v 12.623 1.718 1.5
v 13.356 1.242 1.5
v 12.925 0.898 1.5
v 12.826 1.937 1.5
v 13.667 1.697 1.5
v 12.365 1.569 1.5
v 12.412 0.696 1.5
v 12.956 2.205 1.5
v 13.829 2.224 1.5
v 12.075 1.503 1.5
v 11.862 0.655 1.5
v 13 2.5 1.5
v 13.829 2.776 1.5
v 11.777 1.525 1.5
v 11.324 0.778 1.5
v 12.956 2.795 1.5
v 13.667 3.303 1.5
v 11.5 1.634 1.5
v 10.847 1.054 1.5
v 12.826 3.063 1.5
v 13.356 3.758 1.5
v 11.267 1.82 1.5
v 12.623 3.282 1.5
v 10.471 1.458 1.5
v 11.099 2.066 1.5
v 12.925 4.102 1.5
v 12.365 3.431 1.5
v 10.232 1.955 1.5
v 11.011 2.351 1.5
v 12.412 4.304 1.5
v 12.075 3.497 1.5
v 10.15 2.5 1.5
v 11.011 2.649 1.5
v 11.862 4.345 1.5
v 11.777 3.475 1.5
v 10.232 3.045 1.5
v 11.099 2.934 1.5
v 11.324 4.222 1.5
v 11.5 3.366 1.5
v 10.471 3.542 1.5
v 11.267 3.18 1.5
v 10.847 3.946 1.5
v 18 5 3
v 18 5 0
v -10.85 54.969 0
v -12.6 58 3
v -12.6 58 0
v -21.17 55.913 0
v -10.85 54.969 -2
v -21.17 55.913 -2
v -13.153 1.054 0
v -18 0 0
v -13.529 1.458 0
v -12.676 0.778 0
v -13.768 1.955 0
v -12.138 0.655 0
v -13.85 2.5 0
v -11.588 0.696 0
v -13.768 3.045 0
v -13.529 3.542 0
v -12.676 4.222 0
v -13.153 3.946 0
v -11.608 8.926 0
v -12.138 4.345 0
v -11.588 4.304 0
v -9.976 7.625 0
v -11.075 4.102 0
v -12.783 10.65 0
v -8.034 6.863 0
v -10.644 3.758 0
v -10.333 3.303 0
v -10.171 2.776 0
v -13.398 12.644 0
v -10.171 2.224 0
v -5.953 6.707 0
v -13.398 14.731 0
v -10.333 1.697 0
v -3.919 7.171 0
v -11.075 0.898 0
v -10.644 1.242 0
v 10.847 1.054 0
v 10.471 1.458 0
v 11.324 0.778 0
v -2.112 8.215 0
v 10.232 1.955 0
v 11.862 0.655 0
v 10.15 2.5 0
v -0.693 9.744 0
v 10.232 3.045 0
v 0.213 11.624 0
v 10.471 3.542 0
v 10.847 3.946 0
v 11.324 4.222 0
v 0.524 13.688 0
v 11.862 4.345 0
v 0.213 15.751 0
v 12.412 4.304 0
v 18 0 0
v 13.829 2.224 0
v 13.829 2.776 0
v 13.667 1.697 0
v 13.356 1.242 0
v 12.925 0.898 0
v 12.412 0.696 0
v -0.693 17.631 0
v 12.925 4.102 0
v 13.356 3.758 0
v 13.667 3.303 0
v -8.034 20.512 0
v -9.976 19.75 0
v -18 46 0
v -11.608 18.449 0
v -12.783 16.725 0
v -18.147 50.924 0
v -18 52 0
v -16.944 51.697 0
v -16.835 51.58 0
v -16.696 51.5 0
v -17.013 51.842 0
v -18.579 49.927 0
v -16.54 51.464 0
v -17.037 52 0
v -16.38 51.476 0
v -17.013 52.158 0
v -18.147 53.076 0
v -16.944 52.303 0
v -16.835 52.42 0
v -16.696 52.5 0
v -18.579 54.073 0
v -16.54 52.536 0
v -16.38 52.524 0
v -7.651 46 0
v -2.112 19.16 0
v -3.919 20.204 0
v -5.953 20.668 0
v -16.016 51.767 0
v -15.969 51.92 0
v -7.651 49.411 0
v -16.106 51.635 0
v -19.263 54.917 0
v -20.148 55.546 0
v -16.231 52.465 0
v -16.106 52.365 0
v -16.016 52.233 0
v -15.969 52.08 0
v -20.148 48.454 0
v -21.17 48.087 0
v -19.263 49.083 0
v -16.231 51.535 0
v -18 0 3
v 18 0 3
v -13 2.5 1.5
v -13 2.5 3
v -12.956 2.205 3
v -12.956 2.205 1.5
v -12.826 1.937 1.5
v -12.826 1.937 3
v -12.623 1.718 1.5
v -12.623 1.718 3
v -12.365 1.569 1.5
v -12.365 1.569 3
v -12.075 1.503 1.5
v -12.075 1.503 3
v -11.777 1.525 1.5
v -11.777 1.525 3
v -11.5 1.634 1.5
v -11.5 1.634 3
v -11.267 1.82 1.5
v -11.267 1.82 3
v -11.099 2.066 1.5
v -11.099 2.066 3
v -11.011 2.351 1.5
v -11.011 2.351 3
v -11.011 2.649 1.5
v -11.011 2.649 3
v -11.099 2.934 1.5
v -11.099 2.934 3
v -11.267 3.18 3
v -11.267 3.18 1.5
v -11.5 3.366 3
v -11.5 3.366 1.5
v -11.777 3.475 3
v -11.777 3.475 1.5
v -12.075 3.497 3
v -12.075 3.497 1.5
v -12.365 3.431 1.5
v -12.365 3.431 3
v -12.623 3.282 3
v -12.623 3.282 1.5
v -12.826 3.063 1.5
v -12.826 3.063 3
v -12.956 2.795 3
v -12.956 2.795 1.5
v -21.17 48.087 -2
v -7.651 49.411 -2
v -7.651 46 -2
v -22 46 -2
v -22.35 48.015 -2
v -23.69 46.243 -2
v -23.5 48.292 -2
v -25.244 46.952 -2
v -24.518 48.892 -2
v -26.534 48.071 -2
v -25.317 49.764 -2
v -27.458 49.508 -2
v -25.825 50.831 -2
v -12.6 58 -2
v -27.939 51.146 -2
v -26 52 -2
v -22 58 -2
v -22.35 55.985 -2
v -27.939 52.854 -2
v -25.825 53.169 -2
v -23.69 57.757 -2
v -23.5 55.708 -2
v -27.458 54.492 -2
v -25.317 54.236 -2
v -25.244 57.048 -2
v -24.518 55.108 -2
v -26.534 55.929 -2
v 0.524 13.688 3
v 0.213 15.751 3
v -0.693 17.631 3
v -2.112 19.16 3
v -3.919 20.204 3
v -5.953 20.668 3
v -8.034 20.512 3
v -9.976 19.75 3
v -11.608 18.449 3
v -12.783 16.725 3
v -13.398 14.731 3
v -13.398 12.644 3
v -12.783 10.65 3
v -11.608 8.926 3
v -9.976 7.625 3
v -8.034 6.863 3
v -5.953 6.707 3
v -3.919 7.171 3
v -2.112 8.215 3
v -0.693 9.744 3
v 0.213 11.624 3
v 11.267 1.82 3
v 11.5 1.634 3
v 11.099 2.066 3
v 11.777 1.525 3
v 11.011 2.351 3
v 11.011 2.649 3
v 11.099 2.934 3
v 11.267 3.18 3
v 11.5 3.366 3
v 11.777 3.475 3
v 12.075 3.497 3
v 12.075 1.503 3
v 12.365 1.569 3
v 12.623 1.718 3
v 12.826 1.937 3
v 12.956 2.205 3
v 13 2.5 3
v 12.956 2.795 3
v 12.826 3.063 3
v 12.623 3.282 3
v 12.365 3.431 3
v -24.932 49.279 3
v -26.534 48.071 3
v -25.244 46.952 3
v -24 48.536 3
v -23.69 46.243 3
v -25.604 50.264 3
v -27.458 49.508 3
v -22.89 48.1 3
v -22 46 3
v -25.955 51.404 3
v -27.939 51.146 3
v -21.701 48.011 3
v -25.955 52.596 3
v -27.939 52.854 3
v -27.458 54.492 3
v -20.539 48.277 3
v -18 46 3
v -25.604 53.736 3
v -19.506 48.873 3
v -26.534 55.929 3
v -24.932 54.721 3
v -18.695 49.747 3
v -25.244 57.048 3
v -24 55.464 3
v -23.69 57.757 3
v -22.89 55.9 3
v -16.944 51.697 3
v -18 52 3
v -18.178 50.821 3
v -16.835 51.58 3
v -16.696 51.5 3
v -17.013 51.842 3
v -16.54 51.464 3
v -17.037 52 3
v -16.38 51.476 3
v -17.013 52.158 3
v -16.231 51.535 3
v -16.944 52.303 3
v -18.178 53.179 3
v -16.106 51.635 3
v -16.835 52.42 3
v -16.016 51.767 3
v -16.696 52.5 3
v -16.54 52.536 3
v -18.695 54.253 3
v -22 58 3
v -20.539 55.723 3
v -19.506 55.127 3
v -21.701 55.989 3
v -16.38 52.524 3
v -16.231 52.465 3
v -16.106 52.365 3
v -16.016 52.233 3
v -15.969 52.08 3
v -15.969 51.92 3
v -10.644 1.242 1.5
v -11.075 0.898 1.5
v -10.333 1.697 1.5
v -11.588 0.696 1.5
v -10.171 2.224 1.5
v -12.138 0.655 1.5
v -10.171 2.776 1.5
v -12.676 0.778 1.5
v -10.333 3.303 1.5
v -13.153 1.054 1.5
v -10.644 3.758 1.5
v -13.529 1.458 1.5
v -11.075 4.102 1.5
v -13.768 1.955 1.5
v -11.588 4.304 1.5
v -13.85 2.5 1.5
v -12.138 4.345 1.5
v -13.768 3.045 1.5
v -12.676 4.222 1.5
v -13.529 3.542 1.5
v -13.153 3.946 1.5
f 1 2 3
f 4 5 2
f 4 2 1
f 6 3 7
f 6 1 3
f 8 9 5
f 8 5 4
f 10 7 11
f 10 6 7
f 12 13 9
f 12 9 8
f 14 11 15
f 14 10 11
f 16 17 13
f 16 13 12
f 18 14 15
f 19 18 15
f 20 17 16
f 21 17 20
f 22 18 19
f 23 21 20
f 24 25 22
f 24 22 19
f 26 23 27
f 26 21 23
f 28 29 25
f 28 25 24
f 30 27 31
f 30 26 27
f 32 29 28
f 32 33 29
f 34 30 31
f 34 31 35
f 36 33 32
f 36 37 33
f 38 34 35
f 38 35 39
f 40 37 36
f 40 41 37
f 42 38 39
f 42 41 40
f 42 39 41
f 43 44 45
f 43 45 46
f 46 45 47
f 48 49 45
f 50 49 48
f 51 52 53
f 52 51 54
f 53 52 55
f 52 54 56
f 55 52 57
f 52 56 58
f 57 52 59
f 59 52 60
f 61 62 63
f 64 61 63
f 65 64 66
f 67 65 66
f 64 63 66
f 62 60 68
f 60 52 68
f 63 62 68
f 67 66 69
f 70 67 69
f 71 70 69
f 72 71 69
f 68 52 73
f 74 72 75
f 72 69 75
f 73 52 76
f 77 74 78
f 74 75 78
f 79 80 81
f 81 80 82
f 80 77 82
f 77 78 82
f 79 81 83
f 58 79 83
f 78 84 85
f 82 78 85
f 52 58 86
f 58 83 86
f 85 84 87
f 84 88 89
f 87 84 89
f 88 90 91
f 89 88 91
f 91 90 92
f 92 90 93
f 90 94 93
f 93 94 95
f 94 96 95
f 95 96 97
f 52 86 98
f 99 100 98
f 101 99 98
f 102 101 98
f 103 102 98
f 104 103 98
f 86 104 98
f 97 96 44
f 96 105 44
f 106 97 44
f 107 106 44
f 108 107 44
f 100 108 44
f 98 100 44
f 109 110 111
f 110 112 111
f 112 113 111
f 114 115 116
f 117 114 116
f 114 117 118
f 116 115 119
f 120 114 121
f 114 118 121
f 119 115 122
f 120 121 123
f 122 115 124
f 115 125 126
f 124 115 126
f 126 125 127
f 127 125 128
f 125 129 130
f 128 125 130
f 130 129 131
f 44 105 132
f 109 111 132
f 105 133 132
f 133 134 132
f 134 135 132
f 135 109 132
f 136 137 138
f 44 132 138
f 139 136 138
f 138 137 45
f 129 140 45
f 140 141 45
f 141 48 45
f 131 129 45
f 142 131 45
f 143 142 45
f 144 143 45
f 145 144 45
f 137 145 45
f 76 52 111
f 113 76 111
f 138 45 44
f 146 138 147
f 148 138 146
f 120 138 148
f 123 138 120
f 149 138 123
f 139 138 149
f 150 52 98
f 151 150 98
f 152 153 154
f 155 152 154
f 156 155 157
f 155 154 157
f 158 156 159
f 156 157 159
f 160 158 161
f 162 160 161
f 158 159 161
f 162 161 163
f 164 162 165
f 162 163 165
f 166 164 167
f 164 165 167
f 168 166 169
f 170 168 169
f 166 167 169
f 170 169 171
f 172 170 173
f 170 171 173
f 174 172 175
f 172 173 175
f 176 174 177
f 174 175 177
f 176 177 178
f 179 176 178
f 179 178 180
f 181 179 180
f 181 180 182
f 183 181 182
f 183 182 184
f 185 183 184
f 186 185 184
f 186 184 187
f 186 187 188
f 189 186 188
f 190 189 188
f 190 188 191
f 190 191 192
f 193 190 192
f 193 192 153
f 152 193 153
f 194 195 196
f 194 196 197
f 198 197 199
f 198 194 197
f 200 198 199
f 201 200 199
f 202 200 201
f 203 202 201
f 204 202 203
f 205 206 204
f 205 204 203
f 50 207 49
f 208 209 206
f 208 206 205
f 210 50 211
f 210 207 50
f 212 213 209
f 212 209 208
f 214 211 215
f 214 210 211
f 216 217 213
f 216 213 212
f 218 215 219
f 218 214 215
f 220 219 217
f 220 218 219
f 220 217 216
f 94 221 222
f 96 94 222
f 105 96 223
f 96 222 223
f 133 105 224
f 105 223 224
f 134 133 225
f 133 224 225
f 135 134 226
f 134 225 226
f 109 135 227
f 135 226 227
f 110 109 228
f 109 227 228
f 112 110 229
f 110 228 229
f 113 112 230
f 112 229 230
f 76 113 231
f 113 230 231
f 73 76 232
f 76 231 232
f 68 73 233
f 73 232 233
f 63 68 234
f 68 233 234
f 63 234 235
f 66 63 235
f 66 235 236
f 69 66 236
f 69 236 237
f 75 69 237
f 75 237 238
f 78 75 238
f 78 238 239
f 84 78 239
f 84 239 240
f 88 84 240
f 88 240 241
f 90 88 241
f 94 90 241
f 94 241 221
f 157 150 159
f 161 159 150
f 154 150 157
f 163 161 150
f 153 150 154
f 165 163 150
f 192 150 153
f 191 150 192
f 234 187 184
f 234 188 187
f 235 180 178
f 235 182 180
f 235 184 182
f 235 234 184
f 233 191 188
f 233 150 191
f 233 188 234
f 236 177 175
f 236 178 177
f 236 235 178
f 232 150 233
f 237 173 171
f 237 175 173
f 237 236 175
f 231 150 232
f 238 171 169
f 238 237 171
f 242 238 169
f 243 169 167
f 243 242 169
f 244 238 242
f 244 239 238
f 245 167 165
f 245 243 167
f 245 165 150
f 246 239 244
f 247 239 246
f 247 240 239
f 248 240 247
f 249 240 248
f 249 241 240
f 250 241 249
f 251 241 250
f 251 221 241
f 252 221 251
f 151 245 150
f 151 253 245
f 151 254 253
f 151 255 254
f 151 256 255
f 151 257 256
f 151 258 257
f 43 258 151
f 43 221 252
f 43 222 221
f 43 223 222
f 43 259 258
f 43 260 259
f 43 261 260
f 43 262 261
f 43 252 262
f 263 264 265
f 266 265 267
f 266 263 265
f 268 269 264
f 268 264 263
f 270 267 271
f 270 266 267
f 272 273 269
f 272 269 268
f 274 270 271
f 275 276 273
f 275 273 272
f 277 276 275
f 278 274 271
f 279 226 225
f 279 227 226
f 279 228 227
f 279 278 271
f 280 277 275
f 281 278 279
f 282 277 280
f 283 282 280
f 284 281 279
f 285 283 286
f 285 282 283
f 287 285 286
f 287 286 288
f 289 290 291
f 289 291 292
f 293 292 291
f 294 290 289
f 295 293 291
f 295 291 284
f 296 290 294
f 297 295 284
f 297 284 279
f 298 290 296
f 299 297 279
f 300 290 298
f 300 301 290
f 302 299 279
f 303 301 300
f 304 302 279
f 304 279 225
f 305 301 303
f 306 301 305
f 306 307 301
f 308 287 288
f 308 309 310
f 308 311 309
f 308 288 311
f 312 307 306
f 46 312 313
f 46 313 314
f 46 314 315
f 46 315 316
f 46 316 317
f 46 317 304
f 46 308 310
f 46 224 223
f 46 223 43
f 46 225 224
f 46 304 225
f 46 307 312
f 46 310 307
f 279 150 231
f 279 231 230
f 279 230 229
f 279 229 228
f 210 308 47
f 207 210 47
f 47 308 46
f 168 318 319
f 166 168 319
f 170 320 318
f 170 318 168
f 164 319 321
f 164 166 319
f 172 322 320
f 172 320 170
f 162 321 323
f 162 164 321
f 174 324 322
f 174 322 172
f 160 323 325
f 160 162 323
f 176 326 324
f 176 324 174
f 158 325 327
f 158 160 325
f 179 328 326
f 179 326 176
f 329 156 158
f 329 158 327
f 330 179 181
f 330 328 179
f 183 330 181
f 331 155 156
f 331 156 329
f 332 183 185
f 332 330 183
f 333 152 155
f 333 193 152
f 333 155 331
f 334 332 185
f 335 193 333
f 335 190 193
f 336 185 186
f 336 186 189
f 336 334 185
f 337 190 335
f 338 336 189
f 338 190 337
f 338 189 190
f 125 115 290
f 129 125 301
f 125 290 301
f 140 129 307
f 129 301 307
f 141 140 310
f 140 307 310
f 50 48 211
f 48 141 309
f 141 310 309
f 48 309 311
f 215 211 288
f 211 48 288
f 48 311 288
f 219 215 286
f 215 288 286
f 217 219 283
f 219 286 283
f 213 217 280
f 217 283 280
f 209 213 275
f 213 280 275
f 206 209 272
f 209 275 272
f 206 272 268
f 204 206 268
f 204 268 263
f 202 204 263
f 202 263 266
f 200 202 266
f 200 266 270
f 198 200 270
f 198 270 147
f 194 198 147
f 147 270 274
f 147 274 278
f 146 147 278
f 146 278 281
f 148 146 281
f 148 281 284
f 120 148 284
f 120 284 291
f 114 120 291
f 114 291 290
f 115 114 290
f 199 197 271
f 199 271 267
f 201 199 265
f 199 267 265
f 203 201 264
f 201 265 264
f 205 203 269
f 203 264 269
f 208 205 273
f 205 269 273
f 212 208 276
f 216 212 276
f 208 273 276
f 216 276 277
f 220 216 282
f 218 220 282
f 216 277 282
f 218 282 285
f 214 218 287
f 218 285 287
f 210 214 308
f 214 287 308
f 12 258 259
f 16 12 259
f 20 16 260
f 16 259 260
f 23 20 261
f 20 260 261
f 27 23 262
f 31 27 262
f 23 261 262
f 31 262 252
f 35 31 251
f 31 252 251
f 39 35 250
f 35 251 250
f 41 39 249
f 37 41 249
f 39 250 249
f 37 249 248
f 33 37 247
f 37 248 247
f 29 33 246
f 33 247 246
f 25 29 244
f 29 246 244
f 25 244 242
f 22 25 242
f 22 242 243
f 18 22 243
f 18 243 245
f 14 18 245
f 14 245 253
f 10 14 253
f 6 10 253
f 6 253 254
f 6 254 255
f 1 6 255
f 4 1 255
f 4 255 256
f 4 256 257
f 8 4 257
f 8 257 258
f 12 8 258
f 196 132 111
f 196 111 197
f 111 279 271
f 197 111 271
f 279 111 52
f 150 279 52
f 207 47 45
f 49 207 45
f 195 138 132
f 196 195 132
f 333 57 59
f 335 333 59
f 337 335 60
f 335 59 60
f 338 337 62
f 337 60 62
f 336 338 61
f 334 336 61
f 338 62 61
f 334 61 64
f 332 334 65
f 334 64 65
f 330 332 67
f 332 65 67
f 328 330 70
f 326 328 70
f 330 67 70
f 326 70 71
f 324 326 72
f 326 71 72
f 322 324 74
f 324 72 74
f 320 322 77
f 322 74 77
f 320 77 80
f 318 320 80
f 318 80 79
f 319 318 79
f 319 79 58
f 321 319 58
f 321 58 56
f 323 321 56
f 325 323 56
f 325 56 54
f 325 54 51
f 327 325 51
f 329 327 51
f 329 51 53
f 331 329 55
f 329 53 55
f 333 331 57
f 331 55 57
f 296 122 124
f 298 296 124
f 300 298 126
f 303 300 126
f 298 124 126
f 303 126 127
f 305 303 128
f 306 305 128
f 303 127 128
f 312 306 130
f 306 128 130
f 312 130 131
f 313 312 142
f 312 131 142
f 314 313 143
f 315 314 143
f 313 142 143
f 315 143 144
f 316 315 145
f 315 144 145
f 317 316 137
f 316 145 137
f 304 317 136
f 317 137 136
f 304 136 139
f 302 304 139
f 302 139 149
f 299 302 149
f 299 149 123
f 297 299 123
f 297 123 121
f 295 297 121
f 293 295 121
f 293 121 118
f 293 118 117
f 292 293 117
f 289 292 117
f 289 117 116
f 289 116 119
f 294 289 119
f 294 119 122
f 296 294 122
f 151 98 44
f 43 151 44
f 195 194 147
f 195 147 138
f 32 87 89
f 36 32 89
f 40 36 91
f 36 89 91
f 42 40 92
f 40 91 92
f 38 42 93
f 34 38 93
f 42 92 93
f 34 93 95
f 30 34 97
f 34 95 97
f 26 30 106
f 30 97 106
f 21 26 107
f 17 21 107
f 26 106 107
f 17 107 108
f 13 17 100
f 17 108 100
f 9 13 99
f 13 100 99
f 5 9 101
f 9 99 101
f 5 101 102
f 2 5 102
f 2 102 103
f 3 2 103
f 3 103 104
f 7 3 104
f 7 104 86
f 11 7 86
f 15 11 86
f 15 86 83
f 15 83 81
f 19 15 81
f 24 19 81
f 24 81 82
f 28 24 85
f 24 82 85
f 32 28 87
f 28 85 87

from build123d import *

# Parameters (mm, degrees)
EXTRUDE_1_DEPTH     = 3
SKETCH_3_R          = 7
CUT_EXTRUDE_1_DEPTH = 65.474801279
SKETCH_4_R          = 1
CUT_EXTRUDE_2_DEPTH = 65.474801279
FILLET_1_RADIUS     = 6
FILLET_1_LENGTH     = 3
EXTRUDE_2_DEPTH     = 2
SKETCH_7_R          = 4
CUT_EXTRUDE_3_DEPTH = 65.598761598
CUT_EXTRUDE_4_DEPTH = 2
SKETCH_9_R          = 0.537141257
CUT_EXTRUDE_5_DEPTH = 65.474801279
SKETCH_10_R         = 1.85
CUT_EXTRUDE_6_DEPTH = 1.5


with BuildPart() as part:
    # 草图1 → 凸台-拉伸1 (new body)
    with BuildSketch(Plane.XY):
        Polygon((-18, 0), (18, 0), (18, 5), (-12.599564267, 58), (-28, 58), (-28, 46), (-18, 46), align=None)
    extrude(amount=EXTRUDE_1_DEPTH)

    # 草图3 → 切除-拉伸1 (cut, through all)
    with BuildSketch(Plane.XY.offset(3)):
        with Locations((-6.476357534, 13.687539211)):
            Circle(SKETCH_3_R)
    extrude(amount=-CUT_EXTRUDE_1_DEPTH, mode=Mode.SUBTRACT)

    # 草图4 → 切除-拉伸2 (cut, through all)
    with BuildSketch(Plane.XY.offset(3)):
        with Locations((12, 2.5)):
            Circle(SKETCH_4_R)
        with Locations(Location((-12, 2.5, 0), (0, 0, 180))):
            Circle(SKETCH_4_R)
    extrude(amount=-CUT_EXTRUDE_2_DEPTH, mode=Mode.SUBTRACT)

    # 圆角1: full round fillet: the end face becomes a half cylinder, R = half its width
    fillet_1_face = Plane((-28, 52, 1.5), x_dir=(0, 0, 1), z_dir=(-1, 0, 0))  # on the end face: x along it, z out of the body
    fillet_1_slab = fillet_1_face.offset(-FILLET_1_RADIUS / 2) * Box(FILLET_1_LENGTH, 2 * FILLET_1_RADIUS, FILLET_1_RADIUS, mode=Mode.PRIVATE)  # the body's end, R deep
    fillet_1_round = Plane((-22, 52, 1.5), x_dir=(-1, 0, 0), z_dir=(0, 0, 1)) * Cylinder(FILLET_1_RADIUS, FILLET_1_LENGTH, mode=Mode.PRIVATE)  # its axis R under the face
    add(fillet_1_slab - fillet_1_round, mode=Mode.SUBTRACT)

    # 草图6 → 凸台-拉伸2 (add)
    with BuildSketch(Plane(origin=(0, 0, 0), x_dir=(-1, 0, 0), z_dir=(0, 0, -1))):
        with BuildLine():
            Line((22, 58), (12.599564267, 58))
            Line((12.599564267, 58), (7.650807626, 49.428502063))
            Line((7.650807626, 49.428502063), (7.650807626, 46))
            Line((7.650807626, 46), (22, 46))
            ThreePointArc((22, 46), (28, 52), (22, 58))
        make_face()
    extrude(amount=EXTRUDE_2_DEPTH)

    # 草图7 → 切除-拉伸3 (cut, through all)
    with BuildSketch(Plane.XY.offset(3)):
        with Locations((-22, 52)):
            Circle(SKETCH_7_R)
    extrude(amount=-CUT_EXTRUDE_3_DEPTH, mode=Mode.SUBTRACT)

    # 草图8 → 切除-拉伸4 (cut)
    with BuildSketch(Plane(origin=(0, 0, -2), x_dir=(-1, 0, 0), z_dir=(0, 0, -1))):
        Polygon((21.170465578, 55.913038799), (21.170465578, 48.086961201), (7.021339854, 49.472936706), (7.021339854, 54.618719507), align=None)
    extrude(amount=-CUT_EXTRUDE_4_DEPTH, mode=Mode.SUBTRACT)

    # 草图9 → 切除-拉伸5 (cut, through all)
    with BuildSketch(Plane(origin=(0, 0, 0), x_dir=(-1, 0, 0), z_dir=(0, 0, -1))):
        with Locations((16.5, 52)):
            Circle(SKETCH_9_R)
    extrude(amount=-CUT_EXTRUDE_5_DEPTH, mode=Mode.SUBTRACT)

    # 草图10 → 切除-拉伸6 (cut)
    with BuildSketch(Plane(origin=(0, 0, 0), x_dir=(-1, 0, 0), z_dir=(0, 0, -1))):
        with Locations((12, 2.5)):
            Circle(SKETCH_10_R)
        with Locations((-12, 2.5)):
            Circle(SKETCH_10_R)
    extrude(amount=-CUT_EXTRUDE_6_DEPTH, mode=Mode.SUBTRACT)


solid = part.part
